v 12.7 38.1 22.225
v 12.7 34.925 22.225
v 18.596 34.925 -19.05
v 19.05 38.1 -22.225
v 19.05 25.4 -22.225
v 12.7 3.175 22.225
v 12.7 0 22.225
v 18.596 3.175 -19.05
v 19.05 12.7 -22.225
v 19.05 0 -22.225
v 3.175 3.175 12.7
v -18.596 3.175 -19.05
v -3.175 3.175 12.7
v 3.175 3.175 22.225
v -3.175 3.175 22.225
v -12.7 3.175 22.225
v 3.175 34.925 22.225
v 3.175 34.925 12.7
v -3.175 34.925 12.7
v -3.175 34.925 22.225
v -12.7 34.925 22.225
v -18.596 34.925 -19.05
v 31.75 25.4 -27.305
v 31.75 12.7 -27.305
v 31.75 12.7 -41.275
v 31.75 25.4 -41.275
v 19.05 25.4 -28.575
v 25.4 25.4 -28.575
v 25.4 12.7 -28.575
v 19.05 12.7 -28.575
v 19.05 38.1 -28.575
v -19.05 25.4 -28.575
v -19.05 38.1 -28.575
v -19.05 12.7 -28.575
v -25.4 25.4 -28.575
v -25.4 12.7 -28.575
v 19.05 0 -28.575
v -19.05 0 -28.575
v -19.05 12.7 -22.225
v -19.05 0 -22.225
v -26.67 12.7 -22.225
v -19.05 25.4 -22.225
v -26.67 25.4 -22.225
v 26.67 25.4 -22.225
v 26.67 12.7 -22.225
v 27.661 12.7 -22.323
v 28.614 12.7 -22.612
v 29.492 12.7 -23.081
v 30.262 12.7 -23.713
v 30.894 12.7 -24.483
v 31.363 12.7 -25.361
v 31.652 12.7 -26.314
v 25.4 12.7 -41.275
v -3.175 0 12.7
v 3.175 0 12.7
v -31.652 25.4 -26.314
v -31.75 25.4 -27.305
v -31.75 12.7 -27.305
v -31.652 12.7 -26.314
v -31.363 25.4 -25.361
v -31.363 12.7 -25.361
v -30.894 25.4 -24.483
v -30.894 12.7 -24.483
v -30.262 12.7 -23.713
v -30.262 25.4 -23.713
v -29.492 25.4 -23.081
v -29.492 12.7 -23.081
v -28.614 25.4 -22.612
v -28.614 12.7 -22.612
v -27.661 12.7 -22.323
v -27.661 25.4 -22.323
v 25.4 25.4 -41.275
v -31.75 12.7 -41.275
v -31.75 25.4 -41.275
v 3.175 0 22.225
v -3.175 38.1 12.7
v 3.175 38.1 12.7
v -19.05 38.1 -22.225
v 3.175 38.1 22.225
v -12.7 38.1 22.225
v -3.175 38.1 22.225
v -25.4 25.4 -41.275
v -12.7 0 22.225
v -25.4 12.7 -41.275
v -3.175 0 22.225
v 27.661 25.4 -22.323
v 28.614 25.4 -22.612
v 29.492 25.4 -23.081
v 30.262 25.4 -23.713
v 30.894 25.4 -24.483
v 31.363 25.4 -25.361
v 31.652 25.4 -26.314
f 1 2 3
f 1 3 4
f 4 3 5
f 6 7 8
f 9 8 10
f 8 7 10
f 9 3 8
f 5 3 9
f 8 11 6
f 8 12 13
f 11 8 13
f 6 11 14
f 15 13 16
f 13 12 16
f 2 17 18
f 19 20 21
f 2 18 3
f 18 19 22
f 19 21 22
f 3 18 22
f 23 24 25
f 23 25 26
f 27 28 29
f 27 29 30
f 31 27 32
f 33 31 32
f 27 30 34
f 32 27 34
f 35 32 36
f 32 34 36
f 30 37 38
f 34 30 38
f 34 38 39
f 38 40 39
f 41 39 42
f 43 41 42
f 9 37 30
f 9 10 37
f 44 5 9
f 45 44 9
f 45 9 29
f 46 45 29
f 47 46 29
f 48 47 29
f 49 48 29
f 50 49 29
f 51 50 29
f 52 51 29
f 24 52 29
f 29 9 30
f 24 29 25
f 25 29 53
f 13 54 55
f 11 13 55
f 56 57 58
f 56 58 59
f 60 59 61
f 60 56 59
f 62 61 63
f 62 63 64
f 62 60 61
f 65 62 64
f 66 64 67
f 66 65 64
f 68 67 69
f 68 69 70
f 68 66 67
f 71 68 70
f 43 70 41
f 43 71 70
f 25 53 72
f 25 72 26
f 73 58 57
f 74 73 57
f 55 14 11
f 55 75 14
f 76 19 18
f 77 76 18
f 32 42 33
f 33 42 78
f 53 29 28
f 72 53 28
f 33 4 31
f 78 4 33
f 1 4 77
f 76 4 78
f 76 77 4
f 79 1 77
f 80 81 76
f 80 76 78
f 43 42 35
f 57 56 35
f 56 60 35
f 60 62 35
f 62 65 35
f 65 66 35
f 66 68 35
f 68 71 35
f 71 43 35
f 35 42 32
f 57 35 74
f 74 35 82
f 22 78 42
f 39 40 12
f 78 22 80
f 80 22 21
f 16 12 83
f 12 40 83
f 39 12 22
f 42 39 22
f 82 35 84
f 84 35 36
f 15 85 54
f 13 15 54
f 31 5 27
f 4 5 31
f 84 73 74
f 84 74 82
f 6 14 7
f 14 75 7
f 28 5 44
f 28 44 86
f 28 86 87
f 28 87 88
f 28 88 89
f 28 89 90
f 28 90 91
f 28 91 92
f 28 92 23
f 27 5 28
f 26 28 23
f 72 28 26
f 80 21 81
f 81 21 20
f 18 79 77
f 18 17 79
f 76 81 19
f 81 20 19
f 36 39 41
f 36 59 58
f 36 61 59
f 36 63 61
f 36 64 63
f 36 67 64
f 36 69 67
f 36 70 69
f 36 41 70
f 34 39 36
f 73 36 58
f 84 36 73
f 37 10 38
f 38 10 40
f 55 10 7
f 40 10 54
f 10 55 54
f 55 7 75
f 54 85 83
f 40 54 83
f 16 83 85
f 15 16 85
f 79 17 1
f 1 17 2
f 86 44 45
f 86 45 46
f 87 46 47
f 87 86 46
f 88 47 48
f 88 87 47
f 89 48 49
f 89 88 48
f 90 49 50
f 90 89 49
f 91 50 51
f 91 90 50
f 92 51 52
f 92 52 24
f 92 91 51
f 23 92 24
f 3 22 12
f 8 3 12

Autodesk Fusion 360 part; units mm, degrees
sketch "Sketch1" plane through (0, 0, 0) normal (0, 1, 0) x (1, 0, 0)
  line L0 (19.05, 22.225) -> (-19.05, 22.225)
  line L1 (-19.05, 22.225) -> (-19.05, -22.225)
  line L2 (-19.05, -22.225) -> (19.05, -22.225)
  line L3 (19.05, -22.225) -> (19.05, 22.225)
  line L4 (0, -22.225) -> (12.7, -22.225)
  line L5 (0, -22.225) -> (-12.7, -22.225)
  line L6 (-19.05, 22.225) -> (-12.7, -22.225)
  line L7 (12.7, -22.225) -> (19.05, 22.225)
  line L8 (0, -22.225) -> (3.175, -22.225)
  line L9 (0, -22.225) -> (-3.175, -22.225)
  line L10 (-3.175, -22.225) -> (-3.175, -12.7)
  line L11 (3.175, -22.225) -> (3.175, -12.7)
  line L12 (-3.175, -12.7) -> (3.175, -12.7)
  dimension "d1" = 38.1
  dimension "d2" = 44.45
extrude "Extrude1" add sketch "Sketch1" along normal blind 38.1 contours L0 L2 L4 L5 L6 L7 L10 L11 L12 makes body 1
sketch "Sketch2" plane through (0, 0, 0) normal (0, -1, 0) x (1, 0, 0)
  line L0 (-3.175, 12.7) -> (-3.175, 22.225)
  line L1 (-3.175, 22.225) -> (-12.7, 22.225)
  line L2 (-12.7, 22.225) -> (-19.05, -22.225)
  line L3 (-19.05, -22.225) -> (19.05, -22.225)
  line L4 (19.05, -22.225) -> (12.7, 22.225)
  line L5 (12.7, 22.225) -> (3.175, 22.225)
  line L6 (3.175, 22.225) -> (3.175, 12.7)
  line L7 (3.175, 12.7) -> (-3.175, 12.7)
sketch "Sketch3" plane through (0, 0, 0) normal (1, 0, 0) x (0, 1, 0)
  line L0 (0, 0) -> (38.1, 0) construction
  line L1 (19.05, 0) -> (19.05, -22.225) construction
  line L2 (19.05, 0) -> (19.05, 22.225) construction
  line L3 (19.05, 22.225) -> (3.175, 22.225) construction
  line L4 (3.175, 22.225) -> (34.925, 22.225)
  line L5 (34.925, 22.225) -> (34.925, -19.05)
  line L6 (34.925, -19.05) -> (3.175, -19.05)
  line L7 (3.175, -19.05) -> (3.175, 22.225)
  dimension "d13" = 31.75
  dimension "d14" = 41.275
extrude "Extrude2" cut sketch "Sketch3" along normal blind 76.2 and the other way blind 60.96 bodies 1
extrude "Extrude3" add 1 faces at (6.35, 12.7, -22.225) along direction (0, 0, -1) blind 6.35 on bodies 1 bodies 1
sketch "Sketch4" plane through (19.05, 0, 0) normal (1, 0, 0) x (0, 1, 0)
  line L0 (38.1, -22.225) -> (0, -22.225)
  line L1 (0, -22.225) -> (0, -28.575)
  line L2 (0, -28.575) -> (38.1, -28.575)
  line L3 (38.1, -28.575) -> (38.1, -22.225)
  line L4 (19.05, -22.225) -> (25.4, -22.225)
  line L5 (19.05, -22.225) -> (12.7, -22.225)
  line L6 (12.7, -22.225) -> (12.7, -28.575)
  line L7 (25.4, -22.225) -> (25.4, -28.575)
  line L8 (12.7, -28.575) -> (25.4, -28.575)
  dimension "d21" = 6.35
extrude "Extrude4" add sketch "Sketch4" along normal blind 12.7 contours L0 L2 L4 L5 L6 L7 L8 bodies 1
extrude "Extrude5" add 1 faces at (31.75, 21.1667, -26.4583) along direction (-1, 0, 0) blind 63.5 on bodies 1 bodies 1
copy_body "Body->Comp1" bodies 1 removing the originals makes body 2 in component "Lower Anvil Holder"
sketch "Sketch5" plane through (0, 0, -28.575) normal (0, 0, -1) x (1, 0, 0)
  line L0 (19.05, -12.7) -> (19.05, 0)
  line L1 (19.05, 0) -> (-19.05, 0)
  line L2 (-19.05, 0) -> (-19.05, -12.7)
  line L3 (-19.05, -12.7) -> (-31.75, -12.7)
  line L4 (-31.75, -12.7) -> (-31.75, -25.4)
  line L5 (-31.75, -25.4) -> (-19.05, -25.4)
  line L6 (-19.05, -25.4) -> (-19.05, -38.1)
  line L7 (-19.05, -38.1) -> (19.05, -38.1)
  line L8 (19.05, -38.1) -> (19.05, -25.4)
  line L9 (19.05, -25.4) -> (31.75, -25.4)
  line L10 (31.75, -25.4) -> (31.75, -12.7)
  line L11 (31.75, -12.7) -> (19.05, -12.7)
  line L12 (31.75, -19.05) -> (25.4, -19.05) construction
  line L13 (25.4, -19.05) -> (25.4, -12.7)
  line L14 (25.4, -19.05) -> (25.4, -25.4)
  line L15 (-31.75, -19.05) -> (-25.4, -19.05) construction
  line L16 (-25.4, -19.05) -> (-25.4, -12.7)
  line L17 (-25.4, -19.05) -> (-25.4, -25.4)
  dimension "d27" = 6.35
  dimension "d28" = 6.35
extrude "Extrude1'" add sketch "Sketch5" along normal blind 12.7 contours L9 L10 L11 L13 L14 | L3 L4 L5 L16 L17 bodies 2 in component "Lower Anvil Holder"
fillet "Fillet1" radius 5.08 2 edges at (-31.75, 19.05, -22.225) (31.75, 19.05, -22.225) on bodies 2 in component "Lower Anvil Holder"
component "Lower Anvil Holder" placed x (1, 0, 0) y (0, 1, 0) z (0, 0, 1) at (0, 0, 0)
